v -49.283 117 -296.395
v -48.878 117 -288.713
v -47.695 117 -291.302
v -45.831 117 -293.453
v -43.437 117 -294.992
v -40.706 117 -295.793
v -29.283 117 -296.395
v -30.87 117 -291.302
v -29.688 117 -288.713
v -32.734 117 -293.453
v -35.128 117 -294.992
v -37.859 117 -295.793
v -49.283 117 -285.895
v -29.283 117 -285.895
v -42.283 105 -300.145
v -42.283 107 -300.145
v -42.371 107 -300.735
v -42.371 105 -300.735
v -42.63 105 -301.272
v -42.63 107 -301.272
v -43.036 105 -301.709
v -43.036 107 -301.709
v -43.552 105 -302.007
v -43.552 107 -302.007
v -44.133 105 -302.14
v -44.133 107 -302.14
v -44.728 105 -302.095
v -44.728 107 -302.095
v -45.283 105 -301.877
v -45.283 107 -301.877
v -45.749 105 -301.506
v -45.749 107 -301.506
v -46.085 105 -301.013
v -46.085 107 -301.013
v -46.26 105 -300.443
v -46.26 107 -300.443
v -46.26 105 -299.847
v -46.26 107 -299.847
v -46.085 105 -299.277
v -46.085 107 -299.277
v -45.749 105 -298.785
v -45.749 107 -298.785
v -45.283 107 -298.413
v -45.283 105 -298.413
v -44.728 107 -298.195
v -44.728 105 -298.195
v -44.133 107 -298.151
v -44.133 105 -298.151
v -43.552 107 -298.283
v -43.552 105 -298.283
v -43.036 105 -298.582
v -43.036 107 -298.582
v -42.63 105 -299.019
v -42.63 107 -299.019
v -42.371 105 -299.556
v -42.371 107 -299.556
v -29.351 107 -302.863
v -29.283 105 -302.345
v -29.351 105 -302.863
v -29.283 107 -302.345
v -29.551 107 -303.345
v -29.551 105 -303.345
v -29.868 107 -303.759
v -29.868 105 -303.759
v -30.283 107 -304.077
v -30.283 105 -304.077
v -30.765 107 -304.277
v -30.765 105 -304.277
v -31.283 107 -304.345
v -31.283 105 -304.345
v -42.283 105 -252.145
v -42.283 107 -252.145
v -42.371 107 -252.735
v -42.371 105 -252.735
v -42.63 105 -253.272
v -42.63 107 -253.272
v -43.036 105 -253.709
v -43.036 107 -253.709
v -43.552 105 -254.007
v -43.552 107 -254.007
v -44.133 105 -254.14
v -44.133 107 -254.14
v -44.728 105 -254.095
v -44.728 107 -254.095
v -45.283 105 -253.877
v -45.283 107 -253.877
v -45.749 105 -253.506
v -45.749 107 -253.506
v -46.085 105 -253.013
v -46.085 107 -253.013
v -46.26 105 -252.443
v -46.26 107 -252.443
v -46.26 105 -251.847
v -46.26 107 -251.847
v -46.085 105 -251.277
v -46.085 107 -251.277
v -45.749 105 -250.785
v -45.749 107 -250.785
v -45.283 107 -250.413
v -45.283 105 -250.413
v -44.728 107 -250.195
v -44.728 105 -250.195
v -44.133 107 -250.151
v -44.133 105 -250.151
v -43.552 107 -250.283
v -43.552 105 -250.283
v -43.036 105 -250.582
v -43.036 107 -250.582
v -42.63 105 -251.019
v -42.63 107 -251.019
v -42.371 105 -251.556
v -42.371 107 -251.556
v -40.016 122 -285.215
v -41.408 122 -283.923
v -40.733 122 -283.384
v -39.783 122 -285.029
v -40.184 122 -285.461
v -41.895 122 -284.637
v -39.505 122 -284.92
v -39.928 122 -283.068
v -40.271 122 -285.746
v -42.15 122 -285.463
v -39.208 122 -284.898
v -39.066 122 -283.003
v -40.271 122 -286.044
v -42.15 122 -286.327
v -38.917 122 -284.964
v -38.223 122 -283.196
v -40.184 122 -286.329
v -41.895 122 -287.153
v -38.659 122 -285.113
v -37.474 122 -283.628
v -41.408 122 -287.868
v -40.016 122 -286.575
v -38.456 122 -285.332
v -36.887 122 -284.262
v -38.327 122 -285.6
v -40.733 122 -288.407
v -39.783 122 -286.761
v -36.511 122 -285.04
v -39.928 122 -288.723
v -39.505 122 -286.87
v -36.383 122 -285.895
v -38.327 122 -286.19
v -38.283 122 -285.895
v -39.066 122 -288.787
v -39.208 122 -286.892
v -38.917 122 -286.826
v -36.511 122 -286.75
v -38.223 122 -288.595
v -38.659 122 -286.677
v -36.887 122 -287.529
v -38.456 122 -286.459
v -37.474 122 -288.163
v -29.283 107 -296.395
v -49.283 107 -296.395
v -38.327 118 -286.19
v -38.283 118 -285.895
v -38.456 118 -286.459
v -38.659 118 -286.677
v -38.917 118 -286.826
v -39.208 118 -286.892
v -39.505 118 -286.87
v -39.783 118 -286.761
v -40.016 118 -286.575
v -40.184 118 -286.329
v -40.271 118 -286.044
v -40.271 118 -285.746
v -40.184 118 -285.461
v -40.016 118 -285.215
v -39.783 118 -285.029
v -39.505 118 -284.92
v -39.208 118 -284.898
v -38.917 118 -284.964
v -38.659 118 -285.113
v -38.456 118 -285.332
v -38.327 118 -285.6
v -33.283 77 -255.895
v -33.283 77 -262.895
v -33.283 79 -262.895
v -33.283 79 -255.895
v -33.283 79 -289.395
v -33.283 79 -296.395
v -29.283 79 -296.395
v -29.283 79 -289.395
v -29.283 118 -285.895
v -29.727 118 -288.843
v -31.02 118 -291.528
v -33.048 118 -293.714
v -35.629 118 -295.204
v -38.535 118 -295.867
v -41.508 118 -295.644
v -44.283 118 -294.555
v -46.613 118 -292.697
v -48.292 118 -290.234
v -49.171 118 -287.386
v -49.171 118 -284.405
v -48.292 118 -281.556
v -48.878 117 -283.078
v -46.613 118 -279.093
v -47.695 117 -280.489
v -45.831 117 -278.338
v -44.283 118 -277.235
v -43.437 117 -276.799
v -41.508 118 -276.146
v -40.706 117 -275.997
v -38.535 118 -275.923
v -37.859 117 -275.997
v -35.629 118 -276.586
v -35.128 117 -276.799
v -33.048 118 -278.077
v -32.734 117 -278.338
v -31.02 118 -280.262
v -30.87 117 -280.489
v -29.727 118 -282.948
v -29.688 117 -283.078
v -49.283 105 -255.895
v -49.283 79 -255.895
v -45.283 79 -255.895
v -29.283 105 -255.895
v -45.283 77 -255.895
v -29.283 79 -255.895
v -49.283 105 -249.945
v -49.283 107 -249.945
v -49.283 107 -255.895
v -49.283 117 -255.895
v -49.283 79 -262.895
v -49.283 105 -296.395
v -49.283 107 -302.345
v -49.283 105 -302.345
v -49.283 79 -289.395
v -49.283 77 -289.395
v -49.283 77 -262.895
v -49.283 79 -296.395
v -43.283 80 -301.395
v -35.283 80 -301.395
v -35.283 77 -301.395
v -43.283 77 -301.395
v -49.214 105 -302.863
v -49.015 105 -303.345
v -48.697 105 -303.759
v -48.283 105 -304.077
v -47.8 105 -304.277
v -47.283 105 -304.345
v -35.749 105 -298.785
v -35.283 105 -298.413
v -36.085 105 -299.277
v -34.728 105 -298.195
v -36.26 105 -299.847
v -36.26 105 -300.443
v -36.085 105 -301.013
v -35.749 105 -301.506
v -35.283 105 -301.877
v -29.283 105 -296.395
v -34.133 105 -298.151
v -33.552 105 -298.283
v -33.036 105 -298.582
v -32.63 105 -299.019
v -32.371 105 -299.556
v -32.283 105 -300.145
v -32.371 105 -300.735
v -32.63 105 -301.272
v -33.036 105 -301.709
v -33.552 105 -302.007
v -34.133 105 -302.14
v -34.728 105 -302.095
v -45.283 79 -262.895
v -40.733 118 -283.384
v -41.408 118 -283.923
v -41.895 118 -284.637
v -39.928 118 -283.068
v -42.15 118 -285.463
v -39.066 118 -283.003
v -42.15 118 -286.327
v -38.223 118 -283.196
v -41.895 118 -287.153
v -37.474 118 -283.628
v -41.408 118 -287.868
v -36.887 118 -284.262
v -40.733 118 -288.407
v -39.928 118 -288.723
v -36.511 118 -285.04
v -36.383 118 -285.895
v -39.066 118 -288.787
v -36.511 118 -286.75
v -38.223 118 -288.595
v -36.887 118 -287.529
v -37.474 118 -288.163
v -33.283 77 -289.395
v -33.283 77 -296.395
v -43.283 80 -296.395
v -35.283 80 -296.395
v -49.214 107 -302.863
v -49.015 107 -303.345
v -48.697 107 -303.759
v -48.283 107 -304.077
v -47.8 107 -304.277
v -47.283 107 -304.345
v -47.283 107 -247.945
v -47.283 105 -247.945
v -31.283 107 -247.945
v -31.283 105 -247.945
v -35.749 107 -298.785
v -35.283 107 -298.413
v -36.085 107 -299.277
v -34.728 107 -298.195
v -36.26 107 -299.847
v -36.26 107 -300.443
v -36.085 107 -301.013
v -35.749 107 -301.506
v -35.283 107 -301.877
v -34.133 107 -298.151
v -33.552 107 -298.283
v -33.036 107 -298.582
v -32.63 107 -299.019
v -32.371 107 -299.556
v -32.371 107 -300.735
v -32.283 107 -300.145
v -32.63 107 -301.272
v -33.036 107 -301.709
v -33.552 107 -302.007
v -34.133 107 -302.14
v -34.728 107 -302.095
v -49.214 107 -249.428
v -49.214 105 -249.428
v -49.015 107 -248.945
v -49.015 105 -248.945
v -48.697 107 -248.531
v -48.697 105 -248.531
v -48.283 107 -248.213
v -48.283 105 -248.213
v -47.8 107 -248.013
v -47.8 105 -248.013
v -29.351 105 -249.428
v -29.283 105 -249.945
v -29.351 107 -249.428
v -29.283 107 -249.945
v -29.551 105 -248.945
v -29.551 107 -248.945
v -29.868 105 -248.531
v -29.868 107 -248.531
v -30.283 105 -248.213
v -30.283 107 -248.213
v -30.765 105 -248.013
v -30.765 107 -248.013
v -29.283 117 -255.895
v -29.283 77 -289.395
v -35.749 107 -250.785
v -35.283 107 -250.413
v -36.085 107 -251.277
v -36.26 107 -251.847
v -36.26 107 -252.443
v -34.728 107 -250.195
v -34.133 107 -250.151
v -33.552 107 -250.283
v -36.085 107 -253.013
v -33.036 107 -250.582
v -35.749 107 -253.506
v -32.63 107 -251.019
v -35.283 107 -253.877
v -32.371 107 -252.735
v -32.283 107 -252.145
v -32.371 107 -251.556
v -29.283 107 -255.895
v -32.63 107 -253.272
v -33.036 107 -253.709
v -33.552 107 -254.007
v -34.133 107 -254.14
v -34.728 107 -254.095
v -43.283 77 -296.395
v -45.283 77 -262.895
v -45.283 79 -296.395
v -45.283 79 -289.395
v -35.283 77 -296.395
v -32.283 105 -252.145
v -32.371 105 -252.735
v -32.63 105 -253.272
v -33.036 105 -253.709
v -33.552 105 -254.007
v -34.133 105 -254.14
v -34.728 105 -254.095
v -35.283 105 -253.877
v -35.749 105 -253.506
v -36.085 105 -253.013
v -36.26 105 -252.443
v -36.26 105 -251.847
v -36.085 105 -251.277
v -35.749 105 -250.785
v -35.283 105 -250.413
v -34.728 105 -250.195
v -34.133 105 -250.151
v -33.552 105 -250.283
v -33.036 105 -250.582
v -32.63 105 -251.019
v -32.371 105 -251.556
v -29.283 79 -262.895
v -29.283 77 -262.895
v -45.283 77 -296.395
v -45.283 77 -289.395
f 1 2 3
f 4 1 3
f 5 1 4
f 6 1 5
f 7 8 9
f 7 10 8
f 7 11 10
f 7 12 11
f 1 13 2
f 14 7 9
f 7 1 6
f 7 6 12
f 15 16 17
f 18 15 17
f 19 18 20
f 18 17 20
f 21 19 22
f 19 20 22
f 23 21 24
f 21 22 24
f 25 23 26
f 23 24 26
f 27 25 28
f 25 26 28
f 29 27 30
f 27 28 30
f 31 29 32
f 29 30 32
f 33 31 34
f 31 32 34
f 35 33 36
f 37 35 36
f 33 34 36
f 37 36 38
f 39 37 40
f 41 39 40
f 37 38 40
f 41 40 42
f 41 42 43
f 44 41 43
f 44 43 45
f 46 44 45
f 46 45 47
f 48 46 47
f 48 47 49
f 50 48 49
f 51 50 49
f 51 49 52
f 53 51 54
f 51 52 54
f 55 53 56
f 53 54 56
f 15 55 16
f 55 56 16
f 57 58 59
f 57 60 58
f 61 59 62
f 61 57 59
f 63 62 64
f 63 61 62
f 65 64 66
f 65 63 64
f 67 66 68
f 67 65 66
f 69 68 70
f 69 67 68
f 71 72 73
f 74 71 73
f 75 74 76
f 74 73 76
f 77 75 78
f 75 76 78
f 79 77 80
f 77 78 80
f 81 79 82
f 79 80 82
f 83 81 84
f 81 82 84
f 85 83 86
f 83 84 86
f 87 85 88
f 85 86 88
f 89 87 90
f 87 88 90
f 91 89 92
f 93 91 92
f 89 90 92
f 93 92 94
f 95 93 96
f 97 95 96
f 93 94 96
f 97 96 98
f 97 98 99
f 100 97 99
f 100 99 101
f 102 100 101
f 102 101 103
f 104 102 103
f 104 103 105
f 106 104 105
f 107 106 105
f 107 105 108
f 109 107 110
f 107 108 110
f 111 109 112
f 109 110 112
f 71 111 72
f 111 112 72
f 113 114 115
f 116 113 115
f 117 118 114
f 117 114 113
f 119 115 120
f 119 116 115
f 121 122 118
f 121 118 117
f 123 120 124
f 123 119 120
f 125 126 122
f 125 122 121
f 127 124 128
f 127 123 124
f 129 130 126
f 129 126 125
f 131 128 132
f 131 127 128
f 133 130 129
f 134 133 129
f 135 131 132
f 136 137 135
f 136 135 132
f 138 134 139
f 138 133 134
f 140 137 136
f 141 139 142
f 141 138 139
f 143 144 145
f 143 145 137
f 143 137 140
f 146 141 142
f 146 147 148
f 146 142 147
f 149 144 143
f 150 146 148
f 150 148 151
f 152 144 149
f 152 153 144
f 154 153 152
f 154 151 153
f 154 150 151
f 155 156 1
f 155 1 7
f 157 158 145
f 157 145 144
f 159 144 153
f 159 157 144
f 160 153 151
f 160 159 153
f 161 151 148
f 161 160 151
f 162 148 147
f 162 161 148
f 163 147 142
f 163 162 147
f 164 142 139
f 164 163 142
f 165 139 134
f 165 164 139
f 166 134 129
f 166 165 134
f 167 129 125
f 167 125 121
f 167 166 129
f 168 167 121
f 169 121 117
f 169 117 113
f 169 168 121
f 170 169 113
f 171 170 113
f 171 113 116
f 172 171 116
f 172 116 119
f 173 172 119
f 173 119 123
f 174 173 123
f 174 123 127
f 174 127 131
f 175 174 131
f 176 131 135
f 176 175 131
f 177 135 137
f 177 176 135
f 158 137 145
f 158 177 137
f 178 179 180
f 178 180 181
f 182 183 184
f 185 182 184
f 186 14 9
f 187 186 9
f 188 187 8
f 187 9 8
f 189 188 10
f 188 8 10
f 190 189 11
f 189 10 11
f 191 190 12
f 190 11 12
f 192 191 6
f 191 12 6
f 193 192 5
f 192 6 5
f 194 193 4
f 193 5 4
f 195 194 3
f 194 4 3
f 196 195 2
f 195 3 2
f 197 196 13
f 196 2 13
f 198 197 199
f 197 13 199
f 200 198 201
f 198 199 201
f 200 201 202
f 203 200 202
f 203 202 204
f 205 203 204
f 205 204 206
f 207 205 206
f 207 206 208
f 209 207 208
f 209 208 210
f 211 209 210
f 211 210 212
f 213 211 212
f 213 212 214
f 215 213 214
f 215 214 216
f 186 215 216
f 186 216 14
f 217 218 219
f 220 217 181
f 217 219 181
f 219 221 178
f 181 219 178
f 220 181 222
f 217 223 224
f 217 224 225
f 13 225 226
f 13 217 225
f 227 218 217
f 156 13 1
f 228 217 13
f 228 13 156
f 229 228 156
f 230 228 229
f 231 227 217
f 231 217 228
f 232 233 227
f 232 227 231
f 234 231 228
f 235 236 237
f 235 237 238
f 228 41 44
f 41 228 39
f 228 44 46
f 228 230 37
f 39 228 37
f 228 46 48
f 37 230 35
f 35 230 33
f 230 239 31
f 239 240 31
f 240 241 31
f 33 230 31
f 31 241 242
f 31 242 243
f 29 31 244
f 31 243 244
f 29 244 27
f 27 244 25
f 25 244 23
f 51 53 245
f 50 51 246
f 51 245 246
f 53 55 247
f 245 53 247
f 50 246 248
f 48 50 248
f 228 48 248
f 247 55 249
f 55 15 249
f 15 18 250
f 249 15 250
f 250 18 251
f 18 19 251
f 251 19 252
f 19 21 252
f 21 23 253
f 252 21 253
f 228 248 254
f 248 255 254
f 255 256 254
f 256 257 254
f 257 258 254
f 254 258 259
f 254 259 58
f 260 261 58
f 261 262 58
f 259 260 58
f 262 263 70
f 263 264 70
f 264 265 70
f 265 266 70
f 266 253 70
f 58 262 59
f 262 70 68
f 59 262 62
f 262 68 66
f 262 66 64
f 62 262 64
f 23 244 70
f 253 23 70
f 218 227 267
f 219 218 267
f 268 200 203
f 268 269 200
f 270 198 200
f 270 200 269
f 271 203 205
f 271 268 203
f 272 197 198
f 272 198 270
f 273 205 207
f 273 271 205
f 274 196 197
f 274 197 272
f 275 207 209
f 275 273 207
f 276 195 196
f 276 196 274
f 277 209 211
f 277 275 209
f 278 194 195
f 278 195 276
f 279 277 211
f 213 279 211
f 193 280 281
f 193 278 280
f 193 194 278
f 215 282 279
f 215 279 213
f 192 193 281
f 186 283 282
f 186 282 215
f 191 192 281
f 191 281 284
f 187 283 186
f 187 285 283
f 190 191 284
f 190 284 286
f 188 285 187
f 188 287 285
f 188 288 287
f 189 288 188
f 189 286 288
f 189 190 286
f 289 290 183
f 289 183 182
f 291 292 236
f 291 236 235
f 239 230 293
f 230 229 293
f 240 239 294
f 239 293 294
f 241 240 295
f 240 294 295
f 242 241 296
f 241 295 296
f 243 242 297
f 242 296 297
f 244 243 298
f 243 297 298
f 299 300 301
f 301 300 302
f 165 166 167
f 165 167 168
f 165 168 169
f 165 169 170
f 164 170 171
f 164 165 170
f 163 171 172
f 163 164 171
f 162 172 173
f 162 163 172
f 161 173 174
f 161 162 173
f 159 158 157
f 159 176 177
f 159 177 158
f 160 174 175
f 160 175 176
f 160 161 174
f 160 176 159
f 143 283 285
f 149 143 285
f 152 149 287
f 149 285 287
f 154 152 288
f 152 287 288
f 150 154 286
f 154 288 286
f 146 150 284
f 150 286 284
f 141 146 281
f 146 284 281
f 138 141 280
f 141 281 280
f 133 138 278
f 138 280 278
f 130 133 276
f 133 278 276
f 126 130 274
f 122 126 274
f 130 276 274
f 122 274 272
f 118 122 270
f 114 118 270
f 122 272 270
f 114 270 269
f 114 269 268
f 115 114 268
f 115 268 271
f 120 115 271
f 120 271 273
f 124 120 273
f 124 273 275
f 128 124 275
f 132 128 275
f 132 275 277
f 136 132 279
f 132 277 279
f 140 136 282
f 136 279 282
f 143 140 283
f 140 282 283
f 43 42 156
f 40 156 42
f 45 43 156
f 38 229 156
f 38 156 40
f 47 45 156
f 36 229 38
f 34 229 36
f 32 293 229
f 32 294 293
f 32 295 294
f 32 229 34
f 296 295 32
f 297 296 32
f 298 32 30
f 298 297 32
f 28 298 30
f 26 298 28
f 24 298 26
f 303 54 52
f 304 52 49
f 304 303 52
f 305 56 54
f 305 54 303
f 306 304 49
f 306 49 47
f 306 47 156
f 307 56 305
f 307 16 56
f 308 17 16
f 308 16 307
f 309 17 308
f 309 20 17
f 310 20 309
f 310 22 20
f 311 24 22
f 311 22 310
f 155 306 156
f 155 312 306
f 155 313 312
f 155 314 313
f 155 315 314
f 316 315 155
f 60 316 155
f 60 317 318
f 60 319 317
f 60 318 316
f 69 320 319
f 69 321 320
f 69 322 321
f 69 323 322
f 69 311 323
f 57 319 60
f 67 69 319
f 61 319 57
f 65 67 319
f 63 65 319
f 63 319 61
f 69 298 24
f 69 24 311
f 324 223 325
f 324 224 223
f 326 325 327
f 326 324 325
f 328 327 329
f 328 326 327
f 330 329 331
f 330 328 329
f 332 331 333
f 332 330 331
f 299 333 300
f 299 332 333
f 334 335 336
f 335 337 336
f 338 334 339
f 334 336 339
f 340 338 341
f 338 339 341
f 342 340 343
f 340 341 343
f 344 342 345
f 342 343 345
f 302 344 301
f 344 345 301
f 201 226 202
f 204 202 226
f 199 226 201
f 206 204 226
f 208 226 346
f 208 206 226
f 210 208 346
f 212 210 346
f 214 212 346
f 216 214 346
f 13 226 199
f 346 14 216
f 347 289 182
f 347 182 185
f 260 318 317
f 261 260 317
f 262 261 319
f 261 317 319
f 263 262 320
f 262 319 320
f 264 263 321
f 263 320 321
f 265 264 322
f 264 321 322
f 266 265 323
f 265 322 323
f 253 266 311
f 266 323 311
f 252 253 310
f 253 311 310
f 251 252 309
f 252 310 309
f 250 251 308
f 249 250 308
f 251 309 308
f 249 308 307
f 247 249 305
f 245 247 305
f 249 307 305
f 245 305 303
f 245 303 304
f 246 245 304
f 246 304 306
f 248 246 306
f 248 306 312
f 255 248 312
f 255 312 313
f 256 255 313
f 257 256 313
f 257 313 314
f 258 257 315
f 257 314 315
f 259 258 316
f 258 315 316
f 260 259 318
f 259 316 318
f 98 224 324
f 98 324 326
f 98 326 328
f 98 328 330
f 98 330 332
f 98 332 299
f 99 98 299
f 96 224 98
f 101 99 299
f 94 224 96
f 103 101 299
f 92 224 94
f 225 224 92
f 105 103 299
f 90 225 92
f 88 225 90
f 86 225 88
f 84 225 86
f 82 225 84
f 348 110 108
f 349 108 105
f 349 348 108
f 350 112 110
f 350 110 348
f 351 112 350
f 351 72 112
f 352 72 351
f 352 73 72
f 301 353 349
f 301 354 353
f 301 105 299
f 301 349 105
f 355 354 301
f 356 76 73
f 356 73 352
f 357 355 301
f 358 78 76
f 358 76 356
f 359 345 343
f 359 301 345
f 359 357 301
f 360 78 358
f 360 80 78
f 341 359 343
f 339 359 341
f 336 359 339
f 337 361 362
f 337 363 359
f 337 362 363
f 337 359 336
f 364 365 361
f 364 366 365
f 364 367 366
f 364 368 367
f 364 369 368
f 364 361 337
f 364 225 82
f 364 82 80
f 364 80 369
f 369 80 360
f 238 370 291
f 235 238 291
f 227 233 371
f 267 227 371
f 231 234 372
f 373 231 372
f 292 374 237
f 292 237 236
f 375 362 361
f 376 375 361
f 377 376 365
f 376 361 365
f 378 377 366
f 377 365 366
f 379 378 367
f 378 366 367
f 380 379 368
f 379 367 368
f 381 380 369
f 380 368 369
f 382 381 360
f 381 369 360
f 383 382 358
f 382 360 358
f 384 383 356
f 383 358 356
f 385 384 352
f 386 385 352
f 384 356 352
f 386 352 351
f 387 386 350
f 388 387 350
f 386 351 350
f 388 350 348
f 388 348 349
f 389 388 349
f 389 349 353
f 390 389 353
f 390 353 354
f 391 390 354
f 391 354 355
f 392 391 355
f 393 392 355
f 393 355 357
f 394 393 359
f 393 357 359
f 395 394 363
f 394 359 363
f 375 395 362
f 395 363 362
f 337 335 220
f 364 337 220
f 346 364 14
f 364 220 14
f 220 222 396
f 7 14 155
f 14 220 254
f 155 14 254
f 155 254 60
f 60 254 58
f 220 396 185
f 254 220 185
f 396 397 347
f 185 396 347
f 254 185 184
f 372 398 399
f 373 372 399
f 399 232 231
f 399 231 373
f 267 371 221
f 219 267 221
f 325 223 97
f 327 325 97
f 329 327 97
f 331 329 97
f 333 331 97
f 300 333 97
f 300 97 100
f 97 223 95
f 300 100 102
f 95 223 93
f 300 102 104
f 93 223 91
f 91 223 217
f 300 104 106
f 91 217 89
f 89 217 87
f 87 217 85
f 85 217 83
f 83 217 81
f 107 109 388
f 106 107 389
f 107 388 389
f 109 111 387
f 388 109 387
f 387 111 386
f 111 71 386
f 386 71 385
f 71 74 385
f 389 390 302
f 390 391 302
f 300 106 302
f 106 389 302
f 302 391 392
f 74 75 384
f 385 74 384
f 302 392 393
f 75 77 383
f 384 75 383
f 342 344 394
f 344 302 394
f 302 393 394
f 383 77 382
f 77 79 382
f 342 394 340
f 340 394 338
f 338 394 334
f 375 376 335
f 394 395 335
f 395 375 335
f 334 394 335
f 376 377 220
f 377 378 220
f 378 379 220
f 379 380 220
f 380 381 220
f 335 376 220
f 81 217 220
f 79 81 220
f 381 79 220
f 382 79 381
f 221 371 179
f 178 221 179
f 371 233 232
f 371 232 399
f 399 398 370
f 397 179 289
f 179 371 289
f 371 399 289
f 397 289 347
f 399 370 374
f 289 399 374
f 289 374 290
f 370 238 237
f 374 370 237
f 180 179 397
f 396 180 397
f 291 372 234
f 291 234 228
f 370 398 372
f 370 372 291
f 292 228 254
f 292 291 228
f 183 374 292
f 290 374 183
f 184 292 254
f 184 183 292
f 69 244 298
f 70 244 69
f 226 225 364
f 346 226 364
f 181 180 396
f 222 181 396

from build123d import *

# Parameters (mm, degrees)
SKETCH2_W           = 20
SKETCH2_H           = 40.5
BOSS_EXTRUDE1_DEPTH = 28
SKETCH3_W           = 20
SKETCH3_H           = 56.4
BOSS_EXTRUDE2_DEPTH = 2
SKETCH4_W           = 20
SKETCH4_H           = 40.5
BOSS_EXTRUDE3_DEPTH = 10
SKETCH5_R           = 10
BOSS_EXTRUDE4_DEPTH = 1
SKETCH6_R           = 2.9
SKETCH6_R_2         = 1
BOSS_EXTRUDE5_DEPTH = 4
SKETCH7_R           = 2
CUT_EXTRUDE1_DEPTH  = 2
FILLET1_R           = 2
SKETCH8_W           = 4
SKETCH8_H           = 7
CUT_EXTRUDE2_DEPTH  = 2
SKETCH9_W           = 8
SKETCH9_H           = 3
BOSS_EXTRUDE6_DEPTH = 5


with BuildPart() as part:
    # Sketch2 → Boss-Extrude1 (new body)
    with BuildSketch(Plane(origin=(0, 77, 0), x_dir=(1, 0, 0), z_dir=(0, 1, 0))):
        with Locations((-39.282617367, 276.14521975)):
            Rectangle(SKETCH2_W, SKETCH2_H)
    extrude(amount=BOSS_EXTRUDE1_DEPTH)

    # Sketch3 → Boss-Extrude2 (add)
    with BuildSketch(Plane(origin=(0, 105, 0), x_dir=(1, 0, 0), z_dir=(0, 1, 0))):
        with Locations((-39.282617367, 276.14521975)):
            Rectangle(SKETCH3_W, SKETCH3_H)
    extrude(amount=BOSS_EXTRUDE2_DEPTH)

    # Sketch4 → Boss-Extrude3 (add)
    with BuildSketch(Plane(origin=(0, 107, 0), x_dir=(1, 0, 0), z_dir=(0, 1, 0))):
        with Locations((-39.282617367, 276.14521975)):
            Rectangle(SKETCH4_W, SKETCH4_H)
    extrude(amount=BOSS_EXTRUDE3_DEPTH)

    # Sketch5 → Boss-Extrude4 (add)
    with BuildSketch(Plane(origin=(0, 117, 0), x_dir=(1, 0, 0), z_dir=(0, 1, 0))):
        with Locations((-39.282617367, 285.89521975)):
            Circle(SKETCH5_R)
    extrude(amount=BOSS_EXTRUDE4_DEPTH)

    # Sketch6 → Boss-Extrude5 (add)
    with BuildSketch(Plane(origin=(0, 118, 0), x_dir=(1, 0, 0), z_dir=(0, 1, 0))):
        with Locations((-39.282617367, 285.89521975)):
            Circle(SKETCH6_R)
        with Locations((-39.282617367, 285.89521975)):
            Circle(SKETCH6_R_2, mode=Mode.SUBTRACT)
    extrude(amount=BOSS_EXTRUDE5_DEPTH)

    # Sketch7 → Cut-Extrude1 (cut)
    with BuildSketch(Plane(origin=(0, 107, 0), x_dir=(1, 0, 0), z_dir=(0, 1, 0))):
        with Locations((-44.282617367, 252.14521975)):
            Circle(SKETCH7_R)
        with Locations((-34.282617367, 252.14521975)):
            Circle(SKETCH7_R)
        with Locations((-34.282617367, 300.14521975)):
            Circle(SKETCH7_R)
        with Locations((-44.282617367, 300.14521975)):
            Circle(SKETCH7_R)
    extrude(amount=-CUT_EXTRUDE1_DEPTH, mode=Mode.SUBTRACT)

    # Fillet1
    fillet1_edges = [part.edges().sort_by_distance(p)[0] for p in [
        (-49.282617367, 106, -247.94521975),
        (-29.282617367, 106, -247.94521975),
        (-49.282617367, 106, -304.34521975),
        (-29.282617367, 106, -304.34521975),
    ]]
    fillet(fillet1_edges, radius=FILLET1_R)

    # Sketch8 → Cut-Extrude2 (cut)
    with BuildSketch(Plane.XZ.offset(-77)):
        with Locations((-31.282617367, -259.39521975)):
            Rectangle(SKETCH8_W, SKETCH8_H)
        with Locations((-31.282617367, -292.89521975)):
            Rectangle(SKETCH8_W, SKETCH8_H)
        with Locations((-47.282617367, -292.89521975)):
            Rectangle(SKETCH8_W, SKETCH8_H)
        with Locations((-47.282617367, -259.39521975)):
            Rectangle(SKETCH8_W, SKETCH8_H)
    extrude(amount=-CUT_EXTRUDE2_DEPTH, mode=Mode.SUBTRACT)

    # Sketch9 → Boss-Extrude6 (add)
    with BuildSketch(Plane(origin=(0, 0, -296.39521975), x_dir=(-1, 0, 0), z_dir=(0, 0, -1))):
        with Locations((39.282617367, 78.5)):
            Rectangle(SKETCH9_W, SKETCH9_H)
    extrude(amount=BOSS_EXTRUDE6_DEPTH)


solid = part.part
